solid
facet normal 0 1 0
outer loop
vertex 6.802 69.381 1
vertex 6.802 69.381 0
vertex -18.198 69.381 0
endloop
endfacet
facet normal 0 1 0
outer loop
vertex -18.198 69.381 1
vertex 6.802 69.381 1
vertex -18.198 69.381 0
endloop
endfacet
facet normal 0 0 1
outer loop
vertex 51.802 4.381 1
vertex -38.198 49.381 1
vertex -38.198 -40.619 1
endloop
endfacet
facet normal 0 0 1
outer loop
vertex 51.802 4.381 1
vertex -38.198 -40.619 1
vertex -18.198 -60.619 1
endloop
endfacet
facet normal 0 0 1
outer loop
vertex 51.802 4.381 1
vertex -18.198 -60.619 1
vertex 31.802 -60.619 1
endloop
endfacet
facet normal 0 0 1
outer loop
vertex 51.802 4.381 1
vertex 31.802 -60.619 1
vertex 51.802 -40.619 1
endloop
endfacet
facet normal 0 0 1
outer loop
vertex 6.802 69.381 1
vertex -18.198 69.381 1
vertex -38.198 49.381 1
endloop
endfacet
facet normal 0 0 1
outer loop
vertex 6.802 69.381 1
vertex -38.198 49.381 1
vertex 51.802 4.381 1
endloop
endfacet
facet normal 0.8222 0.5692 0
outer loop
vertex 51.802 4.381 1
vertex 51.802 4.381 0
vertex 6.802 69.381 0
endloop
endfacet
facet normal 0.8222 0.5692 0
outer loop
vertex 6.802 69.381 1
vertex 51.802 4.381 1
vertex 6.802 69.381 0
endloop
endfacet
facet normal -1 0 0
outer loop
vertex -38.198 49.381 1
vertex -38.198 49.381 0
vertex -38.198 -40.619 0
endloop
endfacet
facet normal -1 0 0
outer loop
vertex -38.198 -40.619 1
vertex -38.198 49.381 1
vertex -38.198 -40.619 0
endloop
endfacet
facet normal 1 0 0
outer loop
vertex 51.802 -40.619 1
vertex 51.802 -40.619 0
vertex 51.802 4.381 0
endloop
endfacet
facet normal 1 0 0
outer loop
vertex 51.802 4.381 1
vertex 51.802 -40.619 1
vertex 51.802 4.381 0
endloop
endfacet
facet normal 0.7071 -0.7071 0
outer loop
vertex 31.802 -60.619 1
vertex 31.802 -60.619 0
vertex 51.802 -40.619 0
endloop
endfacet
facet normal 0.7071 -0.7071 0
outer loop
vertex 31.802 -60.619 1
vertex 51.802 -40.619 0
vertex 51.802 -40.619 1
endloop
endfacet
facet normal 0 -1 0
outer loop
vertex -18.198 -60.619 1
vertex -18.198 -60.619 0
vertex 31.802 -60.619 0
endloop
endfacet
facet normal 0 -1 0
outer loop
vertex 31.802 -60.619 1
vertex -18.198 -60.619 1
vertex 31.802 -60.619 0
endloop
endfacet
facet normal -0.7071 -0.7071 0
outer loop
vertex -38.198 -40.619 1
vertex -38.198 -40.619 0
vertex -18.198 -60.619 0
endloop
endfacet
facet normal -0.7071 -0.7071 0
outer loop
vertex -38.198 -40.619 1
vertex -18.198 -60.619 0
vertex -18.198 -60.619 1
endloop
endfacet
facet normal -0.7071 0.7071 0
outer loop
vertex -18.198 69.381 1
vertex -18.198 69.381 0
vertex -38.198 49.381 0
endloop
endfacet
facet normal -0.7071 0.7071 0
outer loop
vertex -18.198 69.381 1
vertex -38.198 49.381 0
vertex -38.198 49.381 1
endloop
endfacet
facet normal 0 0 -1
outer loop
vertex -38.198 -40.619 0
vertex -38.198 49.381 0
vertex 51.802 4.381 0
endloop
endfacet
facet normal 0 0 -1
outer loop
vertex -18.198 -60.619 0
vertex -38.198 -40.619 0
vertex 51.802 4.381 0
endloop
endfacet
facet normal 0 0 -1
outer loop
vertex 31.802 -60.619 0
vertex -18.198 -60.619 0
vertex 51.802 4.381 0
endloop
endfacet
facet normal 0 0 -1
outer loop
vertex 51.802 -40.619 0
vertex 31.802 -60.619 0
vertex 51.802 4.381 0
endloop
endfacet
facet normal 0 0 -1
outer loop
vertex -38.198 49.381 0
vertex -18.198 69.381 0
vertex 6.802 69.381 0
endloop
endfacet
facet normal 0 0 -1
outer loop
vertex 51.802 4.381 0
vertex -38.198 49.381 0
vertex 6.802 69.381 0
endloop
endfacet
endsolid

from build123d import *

# Parameters (mm, degrees)
F1_DEPTH = 1
F2_SIZE  = 20
F3_SIZE  = 20
F4_SIZE  = 20


with BuildPart() as f1:
    # F0 (on Top) → F1 (new body)
    with BuildSketch(Plane.XY):
        Polygon((6.802157, 69.381405), (-38.197843, 69.381405), (-38.197843, -60.618595), (51.802157, -60.618595), (51.802157, 4.381405), align=None)
    extrude(amount=F1_DEPTH)

    # F2
    f2_edges = [f1.edges().sort_by_distance(p)[0] for p in [
        (51.802157, -60.618595, 0.5),
    ]]
    chamfer(f2_edges, length=F2_SIZE)

    # F3
    f3_edges = [f1.edges().sort_by_distance(p)[0] for p in [
        (-38.197843, -60.618595, 0.5),
    ]]
    chamfer(f3_edges, length=F3_SIZE)

    # F4
    f4_edges = [f1.edges().sort_by_distance(p)[0] for p in [
        (-38.197843, 69.381405, 0.5),
    ]]
    chamfer(f4_edges, length=F4_SIZE)


solid = f1.part
